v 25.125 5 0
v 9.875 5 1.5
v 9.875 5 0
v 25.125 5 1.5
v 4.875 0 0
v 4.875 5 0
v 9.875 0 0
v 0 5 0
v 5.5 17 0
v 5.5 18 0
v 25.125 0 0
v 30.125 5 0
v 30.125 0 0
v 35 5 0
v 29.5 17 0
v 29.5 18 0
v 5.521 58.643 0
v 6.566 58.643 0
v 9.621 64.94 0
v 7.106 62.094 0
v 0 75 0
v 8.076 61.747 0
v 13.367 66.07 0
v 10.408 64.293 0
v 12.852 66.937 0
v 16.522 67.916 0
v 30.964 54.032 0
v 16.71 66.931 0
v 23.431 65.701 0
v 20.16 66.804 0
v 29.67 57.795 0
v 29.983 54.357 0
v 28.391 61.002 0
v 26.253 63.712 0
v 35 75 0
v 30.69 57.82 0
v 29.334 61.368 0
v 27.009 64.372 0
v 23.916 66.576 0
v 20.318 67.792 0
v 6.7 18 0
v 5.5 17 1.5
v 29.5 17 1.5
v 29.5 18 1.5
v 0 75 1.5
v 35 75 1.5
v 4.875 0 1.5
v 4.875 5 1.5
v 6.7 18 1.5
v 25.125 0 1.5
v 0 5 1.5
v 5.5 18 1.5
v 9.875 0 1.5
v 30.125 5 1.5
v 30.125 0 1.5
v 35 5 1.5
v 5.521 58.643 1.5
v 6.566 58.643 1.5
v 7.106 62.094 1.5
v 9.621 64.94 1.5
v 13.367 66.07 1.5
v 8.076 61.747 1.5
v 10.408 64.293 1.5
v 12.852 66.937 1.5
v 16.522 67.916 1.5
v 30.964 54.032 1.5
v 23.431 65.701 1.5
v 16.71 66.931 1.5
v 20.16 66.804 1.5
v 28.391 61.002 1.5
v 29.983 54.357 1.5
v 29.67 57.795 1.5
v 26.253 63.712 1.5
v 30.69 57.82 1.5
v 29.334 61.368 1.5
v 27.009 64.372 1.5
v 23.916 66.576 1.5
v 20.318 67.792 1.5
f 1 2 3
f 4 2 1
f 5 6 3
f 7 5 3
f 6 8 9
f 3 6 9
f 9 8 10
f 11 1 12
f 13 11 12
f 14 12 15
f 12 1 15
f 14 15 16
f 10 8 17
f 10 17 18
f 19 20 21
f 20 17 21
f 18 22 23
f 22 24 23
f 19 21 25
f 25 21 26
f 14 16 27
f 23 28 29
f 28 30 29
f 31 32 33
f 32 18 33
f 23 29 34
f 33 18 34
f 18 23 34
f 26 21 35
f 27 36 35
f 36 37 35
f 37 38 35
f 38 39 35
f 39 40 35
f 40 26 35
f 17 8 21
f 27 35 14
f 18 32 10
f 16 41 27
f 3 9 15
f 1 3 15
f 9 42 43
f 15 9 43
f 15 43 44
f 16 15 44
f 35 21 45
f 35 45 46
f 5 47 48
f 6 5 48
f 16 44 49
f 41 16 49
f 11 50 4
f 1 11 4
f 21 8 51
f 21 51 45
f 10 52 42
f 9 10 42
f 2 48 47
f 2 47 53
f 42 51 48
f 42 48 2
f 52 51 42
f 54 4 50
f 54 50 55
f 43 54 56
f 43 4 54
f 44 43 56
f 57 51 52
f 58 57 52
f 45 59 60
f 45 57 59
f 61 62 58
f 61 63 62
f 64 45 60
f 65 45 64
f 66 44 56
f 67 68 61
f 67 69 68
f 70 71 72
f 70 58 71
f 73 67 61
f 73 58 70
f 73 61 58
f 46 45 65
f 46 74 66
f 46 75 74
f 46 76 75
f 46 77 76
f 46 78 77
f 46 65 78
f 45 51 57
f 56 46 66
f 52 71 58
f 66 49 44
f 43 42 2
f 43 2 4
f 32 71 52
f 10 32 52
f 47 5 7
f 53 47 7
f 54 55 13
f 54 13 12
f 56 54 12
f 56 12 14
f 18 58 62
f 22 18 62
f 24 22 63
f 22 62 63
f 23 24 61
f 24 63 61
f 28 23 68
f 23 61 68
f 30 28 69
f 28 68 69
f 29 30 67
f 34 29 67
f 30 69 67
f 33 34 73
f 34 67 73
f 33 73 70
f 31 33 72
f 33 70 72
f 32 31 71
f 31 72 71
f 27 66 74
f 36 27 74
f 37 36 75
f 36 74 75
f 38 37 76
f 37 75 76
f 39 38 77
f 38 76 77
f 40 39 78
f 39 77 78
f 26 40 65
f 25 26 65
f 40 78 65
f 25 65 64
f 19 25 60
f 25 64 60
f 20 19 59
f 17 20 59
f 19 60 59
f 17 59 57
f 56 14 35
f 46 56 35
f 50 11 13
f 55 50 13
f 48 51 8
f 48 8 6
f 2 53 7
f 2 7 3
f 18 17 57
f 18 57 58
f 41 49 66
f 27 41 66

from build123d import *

# Parameters (mm, degrees)
SKIZZE1_W                        = 35
SKIZZE1_H                        = 75
AUFSATZ_LINEAR_AUSTRAGEN1_DEPTH  = 1.5
SKIZZE3_W                        = 15.25
SKIZZE3_H                        = 5
SKIZZE3_W_2                      = 4.875
SCHNITT_LINEAR_AUSTRAGEN12_DEPTH = 20
SCHNITT_LINEAR_AUSTRAGEN14_DEPTH = 1.5


with BuildPart() as part:
    # Skizze1 → Aufsatz-Linear austragen1 (new body)
    with BuildSketch(Plane.XY):
        with Locations((17.5, 37.5)):
            Rectangle(SKIZZE1_W, SKIZZE1_H)
    extrude(amount=AUFSATZ_LINEAR_AUSTRAGEN1_DEPTH)

    # Skizze3 → Schnitt-Linear austragen12 (cut)
    with BuildSketch(Plane.XY.offset(1.5)):
        with Locations((17.5, 2.5)):
            Rectangle(SKIZZE3_W, SKIZZE3_H)
        with Locations((32.5625, 2.5)):
            Rectangle(SKIZZE3_W_2, SKIZZE3_H)
        with Locations((2.4375, 2.5)):
            Rectangle(SKIZZE3_W_2, SKIZZE3_H)
    extrude(amount=-SCHNITT_LINEAR_AUSTRAGEN12_DEPTH, mode=Mode.SUBTRACT)

    # Skizze7 → Schnitt-Linear austragen14 (cut)
    with BuildSketch(Plane.XY.offset(1.5)):
        with BuildLine():
            Line((29.982770168, 54.357178796), (5.5, 18))
            Line((5.5, 18), (5.5, 17))
            Line((5.5, 17), (29.5, 17))
            Line((29.5, 17), (29.5, 18))
            Line((29.5, 18), (6.7, 18))
            Line((6.7, 18), (30.963924784, 54.032191031))
            ThreePointArc((30.963924784, 54.032191031), (20.317920223, 67.791686591), (5.520765623, 58.642623967))
            Line((5.520765623, 58.642623967), (6.566221507, 58.642623967))
            ThreePointArc((6.566221507, 58.642623967), (20.16023333, 66.803956623), (29.982770168, 54.357178796))
        make_face()
    extrude(amount=-SCHNITT_LINEAR_AUSTRAGEN14_DEPTH, mode=Mode.SUBTRACT)


solid = part.part
